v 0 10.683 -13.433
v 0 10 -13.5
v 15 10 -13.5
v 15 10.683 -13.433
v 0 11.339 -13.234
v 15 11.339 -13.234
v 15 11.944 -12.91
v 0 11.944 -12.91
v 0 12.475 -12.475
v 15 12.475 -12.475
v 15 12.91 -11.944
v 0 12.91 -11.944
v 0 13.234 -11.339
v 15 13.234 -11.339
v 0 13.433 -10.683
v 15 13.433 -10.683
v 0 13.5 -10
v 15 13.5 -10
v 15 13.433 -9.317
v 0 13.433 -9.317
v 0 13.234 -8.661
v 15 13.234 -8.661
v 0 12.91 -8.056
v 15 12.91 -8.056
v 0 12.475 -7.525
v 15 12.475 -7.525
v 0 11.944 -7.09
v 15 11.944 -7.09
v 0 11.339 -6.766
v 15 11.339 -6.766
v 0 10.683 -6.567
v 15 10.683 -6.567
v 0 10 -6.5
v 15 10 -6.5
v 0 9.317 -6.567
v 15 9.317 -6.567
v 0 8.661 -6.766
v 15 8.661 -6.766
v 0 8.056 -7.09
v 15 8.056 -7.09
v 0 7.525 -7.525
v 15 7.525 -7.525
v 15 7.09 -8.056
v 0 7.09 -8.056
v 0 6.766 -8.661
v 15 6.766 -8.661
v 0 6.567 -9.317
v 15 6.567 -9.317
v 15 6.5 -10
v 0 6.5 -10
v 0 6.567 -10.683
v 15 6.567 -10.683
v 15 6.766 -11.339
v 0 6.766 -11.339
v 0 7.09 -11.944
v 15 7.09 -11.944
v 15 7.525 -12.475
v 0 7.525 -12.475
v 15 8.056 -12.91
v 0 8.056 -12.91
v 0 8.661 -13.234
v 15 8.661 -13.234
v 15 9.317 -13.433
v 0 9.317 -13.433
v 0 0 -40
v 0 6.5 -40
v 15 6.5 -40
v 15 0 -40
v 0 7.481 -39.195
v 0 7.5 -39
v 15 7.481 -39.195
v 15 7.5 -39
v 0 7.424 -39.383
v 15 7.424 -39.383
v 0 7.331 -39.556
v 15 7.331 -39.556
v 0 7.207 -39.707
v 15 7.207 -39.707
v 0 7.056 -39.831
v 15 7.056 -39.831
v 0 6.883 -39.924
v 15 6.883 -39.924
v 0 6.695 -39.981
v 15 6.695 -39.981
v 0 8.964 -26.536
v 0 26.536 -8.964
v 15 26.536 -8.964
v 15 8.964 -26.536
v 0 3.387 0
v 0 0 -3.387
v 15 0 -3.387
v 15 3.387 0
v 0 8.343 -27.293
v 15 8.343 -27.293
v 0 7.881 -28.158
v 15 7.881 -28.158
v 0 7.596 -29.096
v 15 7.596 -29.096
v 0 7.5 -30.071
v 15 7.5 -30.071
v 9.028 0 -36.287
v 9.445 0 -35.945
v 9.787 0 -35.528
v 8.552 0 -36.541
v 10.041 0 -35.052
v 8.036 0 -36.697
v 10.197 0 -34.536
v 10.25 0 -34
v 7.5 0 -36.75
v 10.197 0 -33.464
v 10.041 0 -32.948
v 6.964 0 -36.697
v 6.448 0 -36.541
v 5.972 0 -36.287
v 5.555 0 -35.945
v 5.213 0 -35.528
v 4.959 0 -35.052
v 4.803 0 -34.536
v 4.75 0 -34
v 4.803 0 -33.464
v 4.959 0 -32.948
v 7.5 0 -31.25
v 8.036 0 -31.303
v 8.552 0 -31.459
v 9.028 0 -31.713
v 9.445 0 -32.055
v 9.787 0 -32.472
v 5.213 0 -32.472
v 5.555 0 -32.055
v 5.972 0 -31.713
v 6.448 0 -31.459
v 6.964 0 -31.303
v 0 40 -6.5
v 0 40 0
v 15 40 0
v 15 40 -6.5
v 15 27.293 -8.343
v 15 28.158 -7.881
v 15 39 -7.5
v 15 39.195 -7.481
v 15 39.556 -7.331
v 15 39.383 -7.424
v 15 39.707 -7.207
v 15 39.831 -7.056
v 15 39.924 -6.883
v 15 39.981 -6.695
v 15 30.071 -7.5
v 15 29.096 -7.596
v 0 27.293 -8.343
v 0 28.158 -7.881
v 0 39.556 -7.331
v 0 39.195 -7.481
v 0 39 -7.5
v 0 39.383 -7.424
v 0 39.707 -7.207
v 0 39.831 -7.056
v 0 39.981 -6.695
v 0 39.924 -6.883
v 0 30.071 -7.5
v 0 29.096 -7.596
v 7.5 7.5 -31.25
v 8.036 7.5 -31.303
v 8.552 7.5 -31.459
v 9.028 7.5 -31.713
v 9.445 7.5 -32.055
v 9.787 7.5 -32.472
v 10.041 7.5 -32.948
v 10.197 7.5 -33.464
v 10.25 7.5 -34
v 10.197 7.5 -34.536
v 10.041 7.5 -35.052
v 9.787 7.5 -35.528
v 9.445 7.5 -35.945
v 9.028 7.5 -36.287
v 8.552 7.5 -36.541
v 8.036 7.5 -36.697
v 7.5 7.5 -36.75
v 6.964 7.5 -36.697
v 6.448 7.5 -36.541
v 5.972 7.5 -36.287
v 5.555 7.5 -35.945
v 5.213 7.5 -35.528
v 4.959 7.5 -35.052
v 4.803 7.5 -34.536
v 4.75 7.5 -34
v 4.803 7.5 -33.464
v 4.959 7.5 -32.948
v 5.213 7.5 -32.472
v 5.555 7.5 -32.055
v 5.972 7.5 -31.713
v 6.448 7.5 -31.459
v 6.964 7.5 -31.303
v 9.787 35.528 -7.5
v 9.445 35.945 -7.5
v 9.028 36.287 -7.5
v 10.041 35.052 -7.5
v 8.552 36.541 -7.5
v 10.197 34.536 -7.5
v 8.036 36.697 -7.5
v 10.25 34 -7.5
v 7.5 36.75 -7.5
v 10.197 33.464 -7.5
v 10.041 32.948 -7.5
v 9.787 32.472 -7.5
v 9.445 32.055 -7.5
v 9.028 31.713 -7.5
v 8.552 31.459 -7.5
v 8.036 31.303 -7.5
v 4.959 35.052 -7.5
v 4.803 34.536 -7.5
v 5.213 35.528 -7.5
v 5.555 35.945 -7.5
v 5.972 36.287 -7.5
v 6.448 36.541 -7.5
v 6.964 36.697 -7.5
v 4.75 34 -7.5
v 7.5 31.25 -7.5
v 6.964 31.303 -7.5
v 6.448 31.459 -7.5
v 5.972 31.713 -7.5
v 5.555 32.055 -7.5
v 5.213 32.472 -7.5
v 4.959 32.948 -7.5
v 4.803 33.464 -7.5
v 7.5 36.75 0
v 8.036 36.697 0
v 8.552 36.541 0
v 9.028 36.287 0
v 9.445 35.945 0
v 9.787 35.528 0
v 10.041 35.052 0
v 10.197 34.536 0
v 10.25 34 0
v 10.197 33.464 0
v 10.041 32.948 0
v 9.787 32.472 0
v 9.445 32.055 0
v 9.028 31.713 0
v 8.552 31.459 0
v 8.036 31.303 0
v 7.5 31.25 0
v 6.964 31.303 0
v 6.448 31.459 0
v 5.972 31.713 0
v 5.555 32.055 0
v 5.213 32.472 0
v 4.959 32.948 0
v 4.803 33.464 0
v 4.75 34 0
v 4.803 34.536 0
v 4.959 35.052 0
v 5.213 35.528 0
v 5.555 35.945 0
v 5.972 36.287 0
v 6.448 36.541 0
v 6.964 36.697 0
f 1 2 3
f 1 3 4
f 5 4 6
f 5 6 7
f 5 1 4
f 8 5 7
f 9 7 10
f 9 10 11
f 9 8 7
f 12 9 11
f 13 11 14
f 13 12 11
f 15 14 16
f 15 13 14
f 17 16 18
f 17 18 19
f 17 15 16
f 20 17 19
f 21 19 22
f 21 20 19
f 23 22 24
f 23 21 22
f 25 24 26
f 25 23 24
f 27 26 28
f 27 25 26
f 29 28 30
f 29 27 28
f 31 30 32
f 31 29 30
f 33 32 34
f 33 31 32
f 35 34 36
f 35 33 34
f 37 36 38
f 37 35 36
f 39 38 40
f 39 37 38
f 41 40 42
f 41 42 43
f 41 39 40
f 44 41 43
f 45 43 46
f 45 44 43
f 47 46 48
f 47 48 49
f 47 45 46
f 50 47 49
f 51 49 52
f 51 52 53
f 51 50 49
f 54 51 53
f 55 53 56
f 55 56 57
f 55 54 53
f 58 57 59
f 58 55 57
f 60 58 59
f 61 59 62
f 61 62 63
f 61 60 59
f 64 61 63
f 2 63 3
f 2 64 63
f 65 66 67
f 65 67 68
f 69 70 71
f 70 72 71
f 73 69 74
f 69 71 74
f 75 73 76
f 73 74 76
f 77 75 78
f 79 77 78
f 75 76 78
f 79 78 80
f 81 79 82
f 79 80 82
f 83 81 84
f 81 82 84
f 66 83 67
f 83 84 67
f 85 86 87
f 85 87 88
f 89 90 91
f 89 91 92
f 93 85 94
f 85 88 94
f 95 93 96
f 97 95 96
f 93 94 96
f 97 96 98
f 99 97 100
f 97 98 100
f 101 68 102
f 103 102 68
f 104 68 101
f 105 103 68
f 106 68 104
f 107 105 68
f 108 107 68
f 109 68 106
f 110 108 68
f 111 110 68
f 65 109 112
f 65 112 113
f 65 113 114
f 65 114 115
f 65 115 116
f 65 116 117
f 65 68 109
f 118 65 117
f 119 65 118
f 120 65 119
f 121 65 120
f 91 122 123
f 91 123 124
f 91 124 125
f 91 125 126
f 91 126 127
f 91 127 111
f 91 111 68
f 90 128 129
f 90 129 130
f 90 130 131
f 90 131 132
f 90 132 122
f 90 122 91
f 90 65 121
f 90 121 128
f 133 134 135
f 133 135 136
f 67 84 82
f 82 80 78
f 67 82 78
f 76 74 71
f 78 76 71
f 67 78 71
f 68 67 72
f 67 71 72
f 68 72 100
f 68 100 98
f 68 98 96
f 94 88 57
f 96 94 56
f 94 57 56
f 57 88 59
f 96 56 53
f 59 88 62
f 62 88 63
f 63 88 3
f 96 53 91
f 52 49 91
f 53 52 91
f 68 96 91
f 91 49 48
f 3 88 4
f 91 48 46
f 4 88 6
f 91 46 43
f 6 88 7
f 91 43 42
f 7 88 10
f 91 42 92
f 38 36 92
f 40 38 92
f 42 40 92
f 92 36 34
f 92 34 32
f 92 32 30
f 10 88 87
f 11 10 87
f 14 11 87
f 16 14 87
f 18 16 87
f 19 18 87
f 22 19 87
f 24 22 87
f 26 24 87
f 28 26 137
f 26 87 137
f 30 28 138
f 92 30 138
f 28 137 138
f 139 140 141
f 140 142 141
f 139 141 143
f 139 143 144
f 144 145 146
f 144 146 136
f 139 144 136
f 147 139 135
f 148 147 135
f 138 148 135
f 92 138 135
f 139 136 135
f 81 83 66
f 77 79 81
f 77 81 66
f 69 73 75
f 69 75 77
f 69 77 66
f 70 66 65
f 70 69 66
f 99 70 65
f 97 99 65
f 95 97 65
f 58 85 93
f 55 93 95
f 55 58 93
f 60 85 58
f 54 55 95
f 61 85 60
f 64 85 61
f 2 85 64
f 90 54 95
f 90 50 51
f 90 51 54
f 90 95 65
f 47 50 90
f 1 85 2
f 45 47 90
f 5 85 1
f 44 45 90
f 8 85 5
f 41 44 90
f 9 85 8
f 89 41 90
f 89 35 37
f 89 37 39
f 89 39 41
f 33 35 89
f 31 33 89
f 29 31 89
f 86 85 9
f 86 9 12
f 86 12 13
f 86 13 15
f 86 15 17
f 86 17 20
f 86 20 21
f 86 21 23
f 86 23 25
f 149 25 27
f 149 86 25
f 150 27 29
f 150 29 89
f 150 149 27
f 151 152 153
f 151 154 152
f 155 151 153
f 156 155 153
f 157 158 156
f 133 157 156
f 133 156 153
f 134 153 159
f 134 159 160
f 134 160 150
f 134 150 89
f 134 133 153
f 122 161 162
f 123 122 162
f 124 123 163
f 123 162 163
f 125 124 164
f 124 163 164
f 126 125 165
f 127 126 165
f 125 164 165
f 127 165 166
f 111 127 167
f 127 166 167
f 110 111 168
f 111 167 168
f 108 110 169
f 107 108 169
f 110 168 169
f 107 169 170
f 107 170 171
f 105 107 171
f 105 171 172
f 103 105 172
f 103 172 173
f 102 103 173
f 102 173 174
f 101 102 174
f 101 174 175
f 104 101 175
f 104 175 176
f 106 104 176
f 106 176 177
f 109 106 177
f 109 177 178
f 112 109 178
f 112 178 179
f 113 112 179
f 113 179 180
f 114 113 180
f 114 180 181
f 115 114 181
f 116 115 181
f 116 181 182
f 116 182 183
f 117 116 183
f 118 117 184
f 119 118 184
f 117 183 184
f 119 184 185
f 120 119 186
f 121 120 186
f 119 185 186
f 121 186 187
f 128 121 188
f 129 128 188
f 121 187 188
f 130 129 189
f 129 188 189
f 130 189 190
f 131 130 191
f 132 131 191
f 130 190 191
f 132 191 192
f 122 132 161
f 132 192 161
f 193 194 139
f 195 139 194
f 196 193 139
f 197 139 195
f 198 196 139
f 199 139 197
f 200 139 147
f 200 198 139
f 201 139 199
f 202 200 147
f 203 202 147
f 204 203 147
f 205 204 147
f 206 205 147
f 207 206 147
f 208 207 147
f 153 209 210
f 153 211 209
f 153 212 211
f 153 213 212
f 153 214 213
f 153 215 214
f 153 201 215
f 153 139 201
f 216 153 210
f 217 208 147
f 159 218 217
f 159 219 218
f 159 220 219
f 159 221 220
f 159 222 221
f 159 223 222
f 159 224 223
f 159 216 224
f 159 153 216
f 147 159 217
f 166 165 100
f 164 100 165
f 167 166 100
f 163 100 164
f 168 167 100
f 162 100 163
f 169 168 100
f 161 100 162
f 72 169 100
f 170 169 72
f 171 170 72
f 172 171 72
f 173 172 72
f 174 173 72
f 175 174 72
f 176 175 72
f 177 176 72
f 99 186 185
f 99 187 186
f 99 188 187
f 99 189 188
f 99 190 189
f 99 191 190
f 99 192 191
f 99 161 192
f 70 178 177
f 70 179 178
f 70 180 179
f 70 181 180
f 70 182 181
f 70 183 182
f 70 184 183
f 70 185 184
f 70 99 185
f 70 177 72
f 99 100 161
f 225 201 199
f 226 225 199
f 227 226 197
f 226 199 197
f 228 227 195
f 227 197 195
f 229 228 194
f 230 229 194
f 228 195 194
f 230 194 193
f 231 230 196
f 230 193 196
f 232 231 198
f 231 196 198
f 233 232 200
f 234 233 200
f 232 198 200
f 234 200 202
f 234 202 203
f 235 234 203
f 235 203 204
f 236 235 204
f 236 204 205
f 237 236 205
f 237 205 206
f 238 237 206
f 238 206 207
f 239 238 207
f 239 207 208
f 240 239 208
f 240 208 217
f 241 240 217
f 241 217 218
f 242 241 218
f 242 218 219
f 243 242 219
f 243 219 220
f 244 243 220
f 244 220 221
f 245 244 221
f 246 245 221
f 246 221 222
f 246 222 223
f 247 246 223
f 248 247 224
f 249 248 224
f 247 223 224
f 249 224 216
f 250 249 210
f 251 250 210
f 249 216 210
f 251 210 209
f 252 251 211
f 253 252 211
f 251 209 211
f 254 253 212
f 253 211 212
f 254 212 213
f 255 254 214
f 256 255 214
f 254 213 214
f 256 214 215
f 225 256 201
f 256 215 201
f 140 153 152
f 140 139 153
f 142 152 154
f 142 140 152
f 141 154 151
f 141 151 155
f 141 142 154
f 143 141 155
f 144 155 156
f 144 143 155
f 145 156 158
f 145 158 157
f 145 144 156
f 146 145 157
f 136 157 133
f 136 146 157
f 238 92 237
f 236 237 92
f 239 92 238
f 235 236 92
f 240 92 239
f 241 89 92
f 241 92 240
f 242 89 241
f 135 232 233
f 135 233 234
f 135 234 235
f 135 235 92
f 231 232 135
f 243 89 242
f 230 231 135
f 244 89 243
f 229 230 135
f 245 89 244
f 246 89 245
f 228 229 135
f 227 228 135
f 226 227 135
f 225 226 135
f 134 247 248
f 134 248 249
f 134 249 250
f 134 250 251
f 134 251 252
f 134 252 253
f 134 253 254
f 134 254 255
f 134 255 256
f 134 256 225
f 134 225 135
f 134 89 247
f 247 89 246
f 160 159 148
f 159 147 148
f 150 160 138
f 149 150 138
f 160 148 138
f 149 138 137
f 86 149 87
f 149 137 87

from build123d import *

# Parameters (mm, degrees)
SKETCH2_R           = 3.5
BOSS_EXTRUDE1_DEPTH = 15
SKETCH3_R           = 2.75
CUT_EXTRUDE1_DEPTH  = 15
SKETCH4_R           = 2.75
CUT_EXTRUDE2_DEPTH  = 15
FILLET1_R           = 5
FILLET2_R           = 1


with BuildPart() as part:
    # Sketch2 → Boss-Extrude1 (new body)
    with BuildSketch(Plane(origin=(0, 0, 0), x_dir=(0, 0, -1), z_dir=(1, 0, 0))):
        Polygon((0, 3.386529676), (0, 40), (7.5, 40), (7.5, 28), (28, 7.5), (40, 7.5), (40, 0), (3.386529676, 0), align=None)
        with Locations((10, 10)):
            Circle(SKETCH2_R, mode=Mode.SUBTRACT)
    extrude(amount=BOSS_EXTRUDE1_DEPTH)

    # Sketch3 → Cut-Extrude1 (cut)
    with BuildSketch(Plane(origin=(0, 7.5, 0), x_dir=(1, 0, 0), z_dir=(0, 1, 0))):
        with Locations(Location((7.5, 34, 0), (0, 0, 270))):
            Circle(SKETCH3_R)
    extrude(amount=-CUT_EXTRUDE1_DEPTH, mode=Mode.SUBTRACT)

    # Sketch4 → Cut-Extrude2 (cut)
    with BuildSketch(Plane(origin=(0, 0, -7.5), x_dir=(-1, 0, 0), z_dir=(0, 0, -1))):
        with Locations(Location((-7.5, 34, 0), (0, 0, 90))):
            Circle(SKETCH4_R)
    extrude(amount=-CUT_EXTRUDE2_DEPTH, mode=Mode.SUBTRACT)

    # Fillet1
    fillet1_edges = [part.edges().sort_by_distance(p)[0] for p in [
        (7.5, 28, -7.5),
        (7.5, 7.5, -28),
    ]]
    fillet(fillet1_edges, radius=FILLET1_R)

    # Fillet2
    fillet2_edges = [part.edges().sort_by_distance(p)[0] for p in [
        (7.5, 40, -7.5),
        (7.5, 7.5, -40),
    ]]
    fillet(fillet2_edges, radius=FILLET2_R)


solid = part.part
